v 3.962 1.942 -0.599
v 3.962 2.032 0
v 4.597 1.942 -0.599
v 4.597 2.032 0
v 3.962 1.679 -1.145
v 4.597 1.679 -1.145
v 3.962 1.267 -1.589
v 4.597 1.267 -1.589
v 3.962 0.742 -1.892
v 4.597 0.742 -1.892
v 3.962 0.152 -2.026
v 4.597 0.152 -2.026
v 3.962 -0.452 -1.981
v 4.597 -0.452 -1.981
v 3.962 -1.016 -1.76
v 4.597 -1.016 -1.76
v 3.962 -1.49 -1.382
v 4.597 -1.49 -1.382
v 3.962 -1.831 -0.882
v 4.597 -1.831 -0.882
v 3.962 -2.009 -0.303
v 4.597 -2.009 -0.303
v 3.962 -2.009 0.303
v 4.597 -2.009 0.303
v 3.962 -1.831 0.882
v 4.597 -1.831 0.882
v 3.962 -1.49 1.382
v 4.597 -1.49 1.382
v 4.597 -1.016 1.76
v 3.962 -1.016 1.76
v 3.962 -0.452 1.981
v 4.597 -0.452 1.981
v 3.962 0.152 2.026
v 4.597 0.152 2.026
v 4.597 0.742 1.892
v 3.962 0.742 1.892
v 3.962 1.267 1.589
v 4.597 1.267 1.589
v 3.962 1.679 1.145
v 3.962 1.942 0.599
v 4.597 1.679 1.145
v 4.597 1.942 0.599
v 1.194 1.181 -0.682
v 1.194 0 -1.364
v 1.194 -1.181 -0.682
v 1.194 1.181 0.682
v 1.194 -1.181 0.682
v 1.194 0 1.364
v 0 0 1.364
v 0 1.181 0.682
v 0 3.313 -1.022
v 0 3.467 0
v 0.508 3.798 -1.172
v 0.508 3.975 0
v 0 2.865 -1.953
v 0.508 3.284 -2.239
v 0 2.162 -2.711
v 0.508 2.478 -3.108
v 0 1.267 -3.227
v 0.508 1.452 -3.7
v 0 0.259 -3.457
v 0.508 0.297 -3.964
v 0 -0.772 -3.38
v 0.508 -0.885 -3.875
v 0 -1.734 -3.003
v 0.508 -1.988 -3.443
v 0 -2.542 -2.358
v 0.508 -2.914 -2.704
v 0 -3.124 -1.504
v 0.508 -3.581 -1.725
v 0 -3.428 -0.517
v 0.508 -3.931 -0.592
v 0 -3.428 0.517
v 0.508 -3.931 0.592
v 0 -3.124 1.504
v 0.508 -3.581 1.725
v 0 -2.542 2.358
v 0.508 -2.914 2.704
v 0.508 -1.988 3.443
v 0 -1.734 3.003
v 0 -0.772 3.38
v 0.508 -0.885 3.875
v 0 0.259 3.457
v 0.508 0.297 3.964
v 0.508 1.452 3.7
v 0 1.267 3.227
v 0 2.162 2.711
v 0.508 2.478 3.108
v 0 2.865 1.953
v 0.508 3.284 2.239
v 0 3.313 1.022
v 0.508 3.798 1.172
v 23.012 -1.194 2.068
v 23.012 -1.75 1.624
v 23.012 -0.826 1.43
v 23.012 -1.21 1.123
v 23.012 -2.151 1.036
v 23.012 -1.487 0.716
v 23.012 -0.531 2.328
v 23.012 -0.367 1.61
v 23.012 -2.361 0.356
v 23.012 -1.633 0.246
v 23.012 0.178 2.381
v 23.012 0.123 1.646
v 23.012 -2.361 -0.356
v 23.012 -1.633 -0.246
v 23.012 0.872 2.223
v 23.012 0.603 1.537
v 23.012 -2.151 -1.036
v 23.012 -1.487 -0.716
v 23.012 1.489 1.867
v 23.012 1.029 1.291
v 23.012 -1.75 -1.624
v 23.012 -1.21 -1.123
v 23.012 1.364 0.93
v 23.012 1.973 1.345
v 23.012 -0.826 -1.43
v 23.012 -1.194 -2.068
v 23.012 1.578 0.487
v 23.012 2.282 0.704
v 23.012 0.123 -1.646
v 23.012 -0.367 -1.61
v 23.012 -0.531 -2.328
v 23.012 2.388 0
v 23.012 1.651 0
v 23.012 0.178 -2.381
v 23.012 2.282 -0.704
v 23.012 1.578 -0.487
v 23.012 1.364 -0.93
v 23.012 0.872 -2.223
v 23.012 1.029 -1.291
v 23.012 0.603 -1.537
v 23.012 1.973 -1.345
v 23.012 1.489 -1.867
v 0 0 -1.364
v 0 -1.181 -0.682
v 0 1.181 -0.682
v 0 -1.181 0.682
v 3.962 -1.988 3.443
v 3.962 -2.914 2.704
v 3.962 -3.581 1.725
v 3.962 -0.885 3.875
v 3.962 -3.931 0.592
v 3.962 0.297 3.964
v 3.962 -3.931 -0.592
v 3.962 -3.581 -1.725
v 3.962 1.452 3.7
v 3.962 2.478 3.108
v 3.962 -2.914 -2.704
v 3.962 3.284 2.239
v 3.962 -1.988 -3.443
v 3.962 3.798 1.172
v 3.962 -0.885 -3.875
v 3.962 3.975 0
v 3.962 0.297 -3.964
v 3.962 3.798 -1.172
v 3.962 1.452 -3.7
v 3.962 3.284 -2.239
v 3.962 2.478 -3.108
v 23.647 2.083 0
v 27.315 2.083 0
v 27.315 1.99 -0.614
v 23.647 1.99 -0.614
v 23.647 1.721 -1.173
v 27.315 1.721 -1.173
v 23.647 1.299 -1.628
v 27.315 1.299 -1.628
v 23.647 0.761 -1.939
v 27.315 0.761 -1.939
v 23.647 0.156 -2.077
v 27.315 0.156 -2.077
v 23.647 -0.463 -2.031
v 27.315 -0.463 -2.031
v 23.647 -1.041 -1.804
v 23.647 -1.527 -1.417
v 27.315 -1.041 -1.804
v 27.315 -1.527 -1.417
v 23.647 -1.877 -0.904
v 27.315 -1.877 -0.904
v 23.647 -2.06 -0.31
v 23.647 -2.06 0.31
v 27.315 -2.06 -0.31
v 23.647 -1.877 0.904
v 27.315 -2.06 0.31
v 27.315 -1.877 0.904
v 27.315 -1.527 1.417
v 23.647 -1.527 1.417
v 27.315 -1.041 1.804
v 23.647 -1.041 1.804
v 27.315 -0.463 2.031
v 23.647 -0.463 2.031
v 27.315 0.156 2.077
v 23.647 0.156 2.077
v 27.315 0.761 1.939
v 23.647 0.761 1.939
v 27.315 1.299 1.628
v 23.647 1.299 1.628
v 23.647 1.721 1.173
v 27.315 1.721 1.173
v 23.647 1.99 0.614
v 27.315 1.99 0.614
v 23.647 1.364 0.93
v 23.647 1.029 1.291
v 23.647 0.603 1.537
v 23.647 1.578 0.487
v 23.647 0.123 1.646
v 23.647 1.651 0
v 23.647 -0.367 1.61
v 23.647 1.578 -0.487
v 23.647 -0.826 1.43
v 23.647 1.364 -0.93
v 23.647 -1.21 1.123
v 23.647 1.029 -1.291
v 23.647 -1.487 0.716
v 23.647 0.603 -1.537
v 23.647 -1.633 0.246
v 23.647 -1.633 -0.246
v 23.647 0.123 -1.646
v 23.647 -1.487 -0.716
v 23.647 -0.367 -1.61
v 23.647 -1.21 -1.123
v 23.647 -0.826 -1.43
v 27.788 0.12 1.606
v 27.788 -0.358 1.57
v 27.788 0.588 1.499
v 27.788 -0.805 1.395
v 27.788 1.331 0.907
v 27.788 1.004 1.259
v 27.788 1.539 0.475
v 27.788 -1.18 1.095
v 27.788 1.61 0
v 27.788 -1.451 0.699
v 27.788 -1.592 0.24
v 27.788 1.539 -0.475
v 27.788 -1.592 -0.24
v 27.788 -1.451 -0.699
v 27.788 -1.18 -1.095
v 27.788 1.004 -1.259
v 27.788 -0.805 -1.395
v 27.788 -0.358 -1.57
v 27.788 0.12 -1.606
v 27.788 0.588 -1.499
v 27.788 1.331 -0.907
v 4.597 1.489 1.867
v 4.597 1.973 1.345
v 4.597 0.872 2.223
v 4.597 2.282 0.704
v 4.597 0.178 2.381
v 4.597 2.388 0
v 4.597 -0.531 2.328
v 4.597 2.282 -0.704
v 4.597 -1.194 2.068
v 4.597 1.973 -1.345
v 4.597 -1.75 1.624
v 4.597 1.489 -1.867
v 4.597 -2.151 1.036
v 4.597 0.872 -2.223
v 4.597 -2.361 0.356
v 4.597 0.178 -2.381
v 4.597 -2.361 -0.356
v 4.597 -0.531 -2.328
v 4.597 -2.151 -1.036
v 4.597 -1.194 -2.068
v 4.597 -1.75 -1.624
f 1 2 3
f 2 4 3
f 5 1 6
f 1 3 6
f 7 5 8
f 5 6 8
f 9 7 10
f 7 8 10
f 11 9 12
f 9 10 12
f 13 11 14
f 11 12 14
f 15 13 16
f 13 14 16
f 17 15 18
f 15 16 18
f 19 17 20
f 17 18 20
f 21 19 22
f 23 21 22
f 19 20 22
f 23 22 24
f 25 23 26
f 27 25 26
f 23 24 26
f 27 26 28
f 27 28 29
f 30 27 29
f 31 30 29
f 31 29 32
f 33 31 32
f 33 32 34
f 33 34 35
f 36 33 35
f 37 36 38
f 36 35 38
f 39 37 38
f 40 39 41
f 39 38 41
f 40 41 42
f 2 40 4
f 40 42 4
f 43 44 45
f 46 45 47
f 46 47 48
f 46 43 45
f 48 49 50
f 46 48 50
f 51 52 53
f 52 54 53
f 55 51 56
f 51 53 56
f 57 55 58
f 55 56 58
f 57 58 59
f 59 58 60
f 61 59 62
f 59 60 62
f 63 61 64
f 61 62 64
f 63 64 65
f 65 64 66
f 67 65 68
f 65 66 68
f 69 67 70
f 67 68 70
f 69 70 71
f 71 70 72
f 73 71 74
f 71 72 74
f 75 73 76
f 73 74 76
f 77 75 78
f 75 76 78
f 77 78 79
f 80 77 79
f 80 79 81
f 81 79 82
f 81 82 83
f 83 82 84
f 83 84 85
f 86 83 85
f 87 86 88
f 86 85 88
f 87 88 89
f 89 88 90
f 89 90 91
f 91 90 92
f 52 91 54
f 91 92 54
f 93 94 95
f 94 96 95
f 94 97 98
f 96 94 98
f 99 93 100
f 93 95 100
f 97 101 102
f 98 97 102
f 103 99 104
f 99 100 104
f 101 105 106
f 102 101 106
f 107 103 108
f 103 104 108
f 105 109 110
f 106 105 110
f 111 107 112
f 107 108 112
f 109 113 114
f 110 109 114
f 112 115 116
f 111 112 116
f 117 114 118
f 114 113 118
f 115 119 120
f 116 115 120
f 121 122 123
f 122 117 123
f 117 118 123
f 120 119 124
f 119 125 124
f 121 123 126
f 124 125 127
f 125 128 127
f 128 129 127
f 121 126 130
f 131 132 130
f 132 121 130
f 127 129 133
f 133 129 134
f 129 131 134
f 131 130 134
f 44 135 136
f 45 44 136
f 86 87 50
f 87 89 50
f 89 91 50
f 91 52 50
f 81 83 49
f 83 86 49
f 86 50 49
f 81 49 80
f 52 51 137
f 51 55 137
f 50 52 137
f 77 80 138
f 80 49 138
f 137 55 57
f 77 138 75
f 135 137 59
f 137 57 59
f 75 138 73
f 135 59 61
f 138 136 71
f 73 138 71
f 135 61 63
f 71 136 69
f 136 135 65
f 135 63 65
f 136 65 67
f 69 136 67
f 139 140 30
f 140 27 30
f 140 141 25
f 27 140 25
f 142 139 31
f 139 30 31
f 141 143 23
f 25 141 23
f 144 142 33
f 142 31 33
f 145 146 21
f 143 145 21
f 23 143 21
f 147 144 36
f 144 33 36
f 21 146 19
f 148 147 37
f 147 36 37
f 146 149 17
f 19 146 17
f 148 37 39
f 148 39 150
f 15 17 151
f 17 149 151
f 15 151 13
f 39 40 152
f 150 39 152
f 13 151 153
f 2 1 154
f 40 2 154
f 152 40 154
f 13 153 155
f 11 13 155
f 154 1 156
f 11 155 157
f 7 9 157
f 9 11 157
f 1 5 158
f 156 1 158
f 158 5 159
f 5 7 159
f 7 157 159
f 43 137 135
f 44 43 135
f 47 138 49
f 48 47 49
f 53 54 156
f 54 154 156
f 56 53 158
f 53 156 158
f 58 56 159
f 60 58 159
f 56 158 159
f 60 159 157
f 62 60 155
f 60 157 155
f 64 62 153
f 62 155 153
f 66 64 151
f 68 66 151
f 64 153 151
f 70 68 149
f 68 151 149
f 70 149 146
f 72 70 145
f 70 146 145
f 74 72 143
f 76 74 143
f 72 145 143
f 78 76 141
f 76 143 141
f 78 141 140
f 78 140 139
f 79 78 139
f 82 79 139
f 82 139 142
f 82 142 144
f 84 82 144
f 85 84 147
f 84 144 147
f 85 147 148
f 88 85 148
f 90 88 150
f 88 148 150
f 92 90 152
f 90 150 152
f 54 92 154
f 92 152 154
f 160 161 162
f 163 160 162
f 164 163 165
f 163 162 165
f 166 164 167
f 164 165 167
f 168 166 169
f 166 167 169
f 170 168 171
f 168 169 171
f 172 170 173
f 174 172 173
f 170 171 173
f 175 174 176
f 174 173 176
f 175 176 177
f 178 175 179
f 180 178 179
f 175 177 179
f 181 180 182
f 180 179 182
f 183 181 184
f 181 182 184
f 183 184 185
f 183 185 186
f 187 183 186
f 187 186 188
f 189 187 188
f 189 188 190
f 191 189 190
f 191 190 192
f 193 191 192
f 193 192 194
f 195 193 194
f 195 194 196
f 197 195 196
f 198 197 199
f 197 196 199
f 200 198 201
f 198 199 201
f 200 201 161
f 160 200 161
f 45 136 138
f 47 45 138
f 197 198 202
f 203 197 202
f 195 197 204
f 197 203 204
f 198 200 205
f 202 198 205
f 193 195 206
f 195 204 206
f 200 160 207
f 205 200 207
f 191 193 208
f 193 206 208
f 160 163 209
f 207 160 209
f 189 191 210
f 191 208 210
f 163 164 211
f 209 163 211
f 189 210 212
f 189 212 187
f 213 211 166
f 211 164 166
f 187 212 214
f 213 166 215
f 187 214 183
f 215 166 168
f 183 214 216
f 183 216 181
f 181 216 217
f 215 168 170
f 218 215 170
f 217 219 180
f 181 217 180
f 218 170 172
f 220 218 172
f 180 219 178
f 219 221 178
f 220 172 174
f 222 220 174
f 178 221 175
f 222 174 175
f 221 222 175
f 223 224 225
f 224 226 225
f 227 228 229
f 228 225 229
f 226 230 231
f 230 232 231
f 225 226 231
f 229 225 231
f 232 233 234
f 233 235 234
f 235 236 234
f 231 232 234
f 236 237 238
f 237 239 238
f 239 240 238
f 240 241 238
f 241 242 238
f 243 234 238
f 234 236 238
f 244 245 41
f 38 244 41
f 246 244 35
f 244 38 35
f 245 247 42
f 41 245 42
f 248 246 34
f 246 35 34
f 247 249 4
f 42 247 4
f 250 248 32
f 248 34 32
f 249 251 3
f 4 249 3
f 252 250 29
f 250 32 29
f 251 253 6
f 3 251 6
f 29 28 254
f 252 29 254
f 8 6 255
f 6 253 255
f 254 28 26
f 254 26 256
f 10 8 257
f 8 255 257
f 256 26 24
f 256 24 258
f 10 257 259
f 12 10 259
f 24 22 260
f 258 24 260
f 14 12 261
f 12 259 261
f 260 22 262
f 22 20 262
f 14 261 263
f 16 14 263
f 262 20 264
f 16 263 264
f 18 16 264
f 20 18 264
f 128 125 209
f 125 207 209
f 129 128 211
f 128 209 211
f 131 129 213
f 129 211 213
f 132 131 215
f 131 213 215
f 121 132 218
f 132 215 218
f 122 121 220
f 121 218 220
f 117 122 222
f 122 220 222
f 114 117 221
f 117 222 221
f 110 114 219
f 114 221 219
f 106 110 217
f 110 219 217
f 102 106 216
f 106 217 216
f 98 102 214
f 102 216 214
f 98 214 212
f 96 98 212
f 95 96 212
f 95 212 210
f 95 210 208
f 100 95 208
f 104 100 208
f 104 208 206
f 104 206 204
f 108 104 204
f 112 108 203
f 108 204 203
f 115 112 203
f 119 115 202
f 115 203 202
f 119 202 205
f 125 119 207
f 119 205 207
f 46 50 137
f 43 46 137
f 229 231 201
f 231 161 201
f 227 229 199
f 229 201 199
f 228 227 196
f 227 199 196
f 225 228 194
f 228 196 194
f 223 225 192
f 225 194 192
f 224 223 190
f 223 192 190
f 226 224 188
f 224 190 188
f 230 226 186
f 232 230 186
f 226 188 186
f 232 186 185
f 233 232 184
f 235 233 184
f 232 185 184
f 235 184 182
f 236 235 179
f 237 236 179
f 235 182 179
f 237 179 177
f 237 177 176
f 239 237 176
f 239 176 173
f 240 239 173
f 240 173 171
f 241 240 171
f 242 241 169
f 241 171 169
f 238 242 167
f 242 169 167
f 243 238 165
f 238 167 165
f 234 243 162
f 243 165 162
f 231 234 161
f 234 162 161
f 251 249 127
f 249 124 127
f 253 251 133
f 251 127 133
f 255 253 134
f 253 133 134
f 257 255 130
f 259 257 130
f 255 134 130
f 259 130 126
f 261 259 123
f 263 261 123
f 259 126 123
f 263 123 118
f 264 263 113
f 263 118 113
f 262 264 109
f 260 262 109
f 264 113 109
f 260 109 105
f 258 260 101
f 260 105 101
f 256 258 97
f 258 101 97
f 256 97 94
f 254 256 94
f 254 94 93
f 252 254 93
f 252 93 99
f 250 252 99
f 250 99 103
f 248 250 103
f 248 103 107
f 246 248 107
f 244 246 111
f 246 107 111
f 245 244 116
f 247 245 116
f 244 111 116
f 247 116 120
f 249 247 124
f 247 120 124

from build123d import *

# Parameters (mm, degrees)
CUT_EXTRUDE1_DEPTH = 1.1938


# Read off the part's stored shape, not the designer's step: #8-32 Machine Threads Stud1
with BuildPart() as part:
    # Sketch1 → Revolve1 (revolve)
    with BuildSketch(Plane.XY):
        Polygon((0, 0), (0, 3.4671), (0.508, 3.9751), (3.9624, 3.9751), (3.9624, 2.032), (4.5974, 2.032), (4.5974, 2.3876), (23.0124, 2.3876), (23.0124, 1.651), (23.6474, 1.651), (23.6474, 2.0828), (27.7876, 2.0828), (27.7876, 0), align=None)
    revolve(axis=Axis((27.7876, 0, 0), (-1, 0, 0)))

    # #8-32 Machine Threads Stud1 outline → #8-32 Machine Threads Stud1 (revolve, cut)
    with BuildSketch(Plane.YX):
        Polygon((2.0828, 27.7876), (1.61036, 27.7876), (2.0828, 27.31516), align=None)
    revolve(axis=Axis((0, 0, 0), (1, 0, 0)), mode=Mode.SUBTRACT)

    # Sketch3 → Cut-Extrude1 (cut)
    with BuildSketch(Plane.ZY):
        Polygon((1.363816806, 0), (0.681908403, 1.1811), (-0.681908403, 1.1811), (-1.363816806, 0), (-0.681908403, -1.1811), (0.681908403, -1.1811), align=None)
    extrude(amount=-CUT_EXTRUDE1_DEPTH, mode=Mode.SUBTRACT)


solid = part.part
